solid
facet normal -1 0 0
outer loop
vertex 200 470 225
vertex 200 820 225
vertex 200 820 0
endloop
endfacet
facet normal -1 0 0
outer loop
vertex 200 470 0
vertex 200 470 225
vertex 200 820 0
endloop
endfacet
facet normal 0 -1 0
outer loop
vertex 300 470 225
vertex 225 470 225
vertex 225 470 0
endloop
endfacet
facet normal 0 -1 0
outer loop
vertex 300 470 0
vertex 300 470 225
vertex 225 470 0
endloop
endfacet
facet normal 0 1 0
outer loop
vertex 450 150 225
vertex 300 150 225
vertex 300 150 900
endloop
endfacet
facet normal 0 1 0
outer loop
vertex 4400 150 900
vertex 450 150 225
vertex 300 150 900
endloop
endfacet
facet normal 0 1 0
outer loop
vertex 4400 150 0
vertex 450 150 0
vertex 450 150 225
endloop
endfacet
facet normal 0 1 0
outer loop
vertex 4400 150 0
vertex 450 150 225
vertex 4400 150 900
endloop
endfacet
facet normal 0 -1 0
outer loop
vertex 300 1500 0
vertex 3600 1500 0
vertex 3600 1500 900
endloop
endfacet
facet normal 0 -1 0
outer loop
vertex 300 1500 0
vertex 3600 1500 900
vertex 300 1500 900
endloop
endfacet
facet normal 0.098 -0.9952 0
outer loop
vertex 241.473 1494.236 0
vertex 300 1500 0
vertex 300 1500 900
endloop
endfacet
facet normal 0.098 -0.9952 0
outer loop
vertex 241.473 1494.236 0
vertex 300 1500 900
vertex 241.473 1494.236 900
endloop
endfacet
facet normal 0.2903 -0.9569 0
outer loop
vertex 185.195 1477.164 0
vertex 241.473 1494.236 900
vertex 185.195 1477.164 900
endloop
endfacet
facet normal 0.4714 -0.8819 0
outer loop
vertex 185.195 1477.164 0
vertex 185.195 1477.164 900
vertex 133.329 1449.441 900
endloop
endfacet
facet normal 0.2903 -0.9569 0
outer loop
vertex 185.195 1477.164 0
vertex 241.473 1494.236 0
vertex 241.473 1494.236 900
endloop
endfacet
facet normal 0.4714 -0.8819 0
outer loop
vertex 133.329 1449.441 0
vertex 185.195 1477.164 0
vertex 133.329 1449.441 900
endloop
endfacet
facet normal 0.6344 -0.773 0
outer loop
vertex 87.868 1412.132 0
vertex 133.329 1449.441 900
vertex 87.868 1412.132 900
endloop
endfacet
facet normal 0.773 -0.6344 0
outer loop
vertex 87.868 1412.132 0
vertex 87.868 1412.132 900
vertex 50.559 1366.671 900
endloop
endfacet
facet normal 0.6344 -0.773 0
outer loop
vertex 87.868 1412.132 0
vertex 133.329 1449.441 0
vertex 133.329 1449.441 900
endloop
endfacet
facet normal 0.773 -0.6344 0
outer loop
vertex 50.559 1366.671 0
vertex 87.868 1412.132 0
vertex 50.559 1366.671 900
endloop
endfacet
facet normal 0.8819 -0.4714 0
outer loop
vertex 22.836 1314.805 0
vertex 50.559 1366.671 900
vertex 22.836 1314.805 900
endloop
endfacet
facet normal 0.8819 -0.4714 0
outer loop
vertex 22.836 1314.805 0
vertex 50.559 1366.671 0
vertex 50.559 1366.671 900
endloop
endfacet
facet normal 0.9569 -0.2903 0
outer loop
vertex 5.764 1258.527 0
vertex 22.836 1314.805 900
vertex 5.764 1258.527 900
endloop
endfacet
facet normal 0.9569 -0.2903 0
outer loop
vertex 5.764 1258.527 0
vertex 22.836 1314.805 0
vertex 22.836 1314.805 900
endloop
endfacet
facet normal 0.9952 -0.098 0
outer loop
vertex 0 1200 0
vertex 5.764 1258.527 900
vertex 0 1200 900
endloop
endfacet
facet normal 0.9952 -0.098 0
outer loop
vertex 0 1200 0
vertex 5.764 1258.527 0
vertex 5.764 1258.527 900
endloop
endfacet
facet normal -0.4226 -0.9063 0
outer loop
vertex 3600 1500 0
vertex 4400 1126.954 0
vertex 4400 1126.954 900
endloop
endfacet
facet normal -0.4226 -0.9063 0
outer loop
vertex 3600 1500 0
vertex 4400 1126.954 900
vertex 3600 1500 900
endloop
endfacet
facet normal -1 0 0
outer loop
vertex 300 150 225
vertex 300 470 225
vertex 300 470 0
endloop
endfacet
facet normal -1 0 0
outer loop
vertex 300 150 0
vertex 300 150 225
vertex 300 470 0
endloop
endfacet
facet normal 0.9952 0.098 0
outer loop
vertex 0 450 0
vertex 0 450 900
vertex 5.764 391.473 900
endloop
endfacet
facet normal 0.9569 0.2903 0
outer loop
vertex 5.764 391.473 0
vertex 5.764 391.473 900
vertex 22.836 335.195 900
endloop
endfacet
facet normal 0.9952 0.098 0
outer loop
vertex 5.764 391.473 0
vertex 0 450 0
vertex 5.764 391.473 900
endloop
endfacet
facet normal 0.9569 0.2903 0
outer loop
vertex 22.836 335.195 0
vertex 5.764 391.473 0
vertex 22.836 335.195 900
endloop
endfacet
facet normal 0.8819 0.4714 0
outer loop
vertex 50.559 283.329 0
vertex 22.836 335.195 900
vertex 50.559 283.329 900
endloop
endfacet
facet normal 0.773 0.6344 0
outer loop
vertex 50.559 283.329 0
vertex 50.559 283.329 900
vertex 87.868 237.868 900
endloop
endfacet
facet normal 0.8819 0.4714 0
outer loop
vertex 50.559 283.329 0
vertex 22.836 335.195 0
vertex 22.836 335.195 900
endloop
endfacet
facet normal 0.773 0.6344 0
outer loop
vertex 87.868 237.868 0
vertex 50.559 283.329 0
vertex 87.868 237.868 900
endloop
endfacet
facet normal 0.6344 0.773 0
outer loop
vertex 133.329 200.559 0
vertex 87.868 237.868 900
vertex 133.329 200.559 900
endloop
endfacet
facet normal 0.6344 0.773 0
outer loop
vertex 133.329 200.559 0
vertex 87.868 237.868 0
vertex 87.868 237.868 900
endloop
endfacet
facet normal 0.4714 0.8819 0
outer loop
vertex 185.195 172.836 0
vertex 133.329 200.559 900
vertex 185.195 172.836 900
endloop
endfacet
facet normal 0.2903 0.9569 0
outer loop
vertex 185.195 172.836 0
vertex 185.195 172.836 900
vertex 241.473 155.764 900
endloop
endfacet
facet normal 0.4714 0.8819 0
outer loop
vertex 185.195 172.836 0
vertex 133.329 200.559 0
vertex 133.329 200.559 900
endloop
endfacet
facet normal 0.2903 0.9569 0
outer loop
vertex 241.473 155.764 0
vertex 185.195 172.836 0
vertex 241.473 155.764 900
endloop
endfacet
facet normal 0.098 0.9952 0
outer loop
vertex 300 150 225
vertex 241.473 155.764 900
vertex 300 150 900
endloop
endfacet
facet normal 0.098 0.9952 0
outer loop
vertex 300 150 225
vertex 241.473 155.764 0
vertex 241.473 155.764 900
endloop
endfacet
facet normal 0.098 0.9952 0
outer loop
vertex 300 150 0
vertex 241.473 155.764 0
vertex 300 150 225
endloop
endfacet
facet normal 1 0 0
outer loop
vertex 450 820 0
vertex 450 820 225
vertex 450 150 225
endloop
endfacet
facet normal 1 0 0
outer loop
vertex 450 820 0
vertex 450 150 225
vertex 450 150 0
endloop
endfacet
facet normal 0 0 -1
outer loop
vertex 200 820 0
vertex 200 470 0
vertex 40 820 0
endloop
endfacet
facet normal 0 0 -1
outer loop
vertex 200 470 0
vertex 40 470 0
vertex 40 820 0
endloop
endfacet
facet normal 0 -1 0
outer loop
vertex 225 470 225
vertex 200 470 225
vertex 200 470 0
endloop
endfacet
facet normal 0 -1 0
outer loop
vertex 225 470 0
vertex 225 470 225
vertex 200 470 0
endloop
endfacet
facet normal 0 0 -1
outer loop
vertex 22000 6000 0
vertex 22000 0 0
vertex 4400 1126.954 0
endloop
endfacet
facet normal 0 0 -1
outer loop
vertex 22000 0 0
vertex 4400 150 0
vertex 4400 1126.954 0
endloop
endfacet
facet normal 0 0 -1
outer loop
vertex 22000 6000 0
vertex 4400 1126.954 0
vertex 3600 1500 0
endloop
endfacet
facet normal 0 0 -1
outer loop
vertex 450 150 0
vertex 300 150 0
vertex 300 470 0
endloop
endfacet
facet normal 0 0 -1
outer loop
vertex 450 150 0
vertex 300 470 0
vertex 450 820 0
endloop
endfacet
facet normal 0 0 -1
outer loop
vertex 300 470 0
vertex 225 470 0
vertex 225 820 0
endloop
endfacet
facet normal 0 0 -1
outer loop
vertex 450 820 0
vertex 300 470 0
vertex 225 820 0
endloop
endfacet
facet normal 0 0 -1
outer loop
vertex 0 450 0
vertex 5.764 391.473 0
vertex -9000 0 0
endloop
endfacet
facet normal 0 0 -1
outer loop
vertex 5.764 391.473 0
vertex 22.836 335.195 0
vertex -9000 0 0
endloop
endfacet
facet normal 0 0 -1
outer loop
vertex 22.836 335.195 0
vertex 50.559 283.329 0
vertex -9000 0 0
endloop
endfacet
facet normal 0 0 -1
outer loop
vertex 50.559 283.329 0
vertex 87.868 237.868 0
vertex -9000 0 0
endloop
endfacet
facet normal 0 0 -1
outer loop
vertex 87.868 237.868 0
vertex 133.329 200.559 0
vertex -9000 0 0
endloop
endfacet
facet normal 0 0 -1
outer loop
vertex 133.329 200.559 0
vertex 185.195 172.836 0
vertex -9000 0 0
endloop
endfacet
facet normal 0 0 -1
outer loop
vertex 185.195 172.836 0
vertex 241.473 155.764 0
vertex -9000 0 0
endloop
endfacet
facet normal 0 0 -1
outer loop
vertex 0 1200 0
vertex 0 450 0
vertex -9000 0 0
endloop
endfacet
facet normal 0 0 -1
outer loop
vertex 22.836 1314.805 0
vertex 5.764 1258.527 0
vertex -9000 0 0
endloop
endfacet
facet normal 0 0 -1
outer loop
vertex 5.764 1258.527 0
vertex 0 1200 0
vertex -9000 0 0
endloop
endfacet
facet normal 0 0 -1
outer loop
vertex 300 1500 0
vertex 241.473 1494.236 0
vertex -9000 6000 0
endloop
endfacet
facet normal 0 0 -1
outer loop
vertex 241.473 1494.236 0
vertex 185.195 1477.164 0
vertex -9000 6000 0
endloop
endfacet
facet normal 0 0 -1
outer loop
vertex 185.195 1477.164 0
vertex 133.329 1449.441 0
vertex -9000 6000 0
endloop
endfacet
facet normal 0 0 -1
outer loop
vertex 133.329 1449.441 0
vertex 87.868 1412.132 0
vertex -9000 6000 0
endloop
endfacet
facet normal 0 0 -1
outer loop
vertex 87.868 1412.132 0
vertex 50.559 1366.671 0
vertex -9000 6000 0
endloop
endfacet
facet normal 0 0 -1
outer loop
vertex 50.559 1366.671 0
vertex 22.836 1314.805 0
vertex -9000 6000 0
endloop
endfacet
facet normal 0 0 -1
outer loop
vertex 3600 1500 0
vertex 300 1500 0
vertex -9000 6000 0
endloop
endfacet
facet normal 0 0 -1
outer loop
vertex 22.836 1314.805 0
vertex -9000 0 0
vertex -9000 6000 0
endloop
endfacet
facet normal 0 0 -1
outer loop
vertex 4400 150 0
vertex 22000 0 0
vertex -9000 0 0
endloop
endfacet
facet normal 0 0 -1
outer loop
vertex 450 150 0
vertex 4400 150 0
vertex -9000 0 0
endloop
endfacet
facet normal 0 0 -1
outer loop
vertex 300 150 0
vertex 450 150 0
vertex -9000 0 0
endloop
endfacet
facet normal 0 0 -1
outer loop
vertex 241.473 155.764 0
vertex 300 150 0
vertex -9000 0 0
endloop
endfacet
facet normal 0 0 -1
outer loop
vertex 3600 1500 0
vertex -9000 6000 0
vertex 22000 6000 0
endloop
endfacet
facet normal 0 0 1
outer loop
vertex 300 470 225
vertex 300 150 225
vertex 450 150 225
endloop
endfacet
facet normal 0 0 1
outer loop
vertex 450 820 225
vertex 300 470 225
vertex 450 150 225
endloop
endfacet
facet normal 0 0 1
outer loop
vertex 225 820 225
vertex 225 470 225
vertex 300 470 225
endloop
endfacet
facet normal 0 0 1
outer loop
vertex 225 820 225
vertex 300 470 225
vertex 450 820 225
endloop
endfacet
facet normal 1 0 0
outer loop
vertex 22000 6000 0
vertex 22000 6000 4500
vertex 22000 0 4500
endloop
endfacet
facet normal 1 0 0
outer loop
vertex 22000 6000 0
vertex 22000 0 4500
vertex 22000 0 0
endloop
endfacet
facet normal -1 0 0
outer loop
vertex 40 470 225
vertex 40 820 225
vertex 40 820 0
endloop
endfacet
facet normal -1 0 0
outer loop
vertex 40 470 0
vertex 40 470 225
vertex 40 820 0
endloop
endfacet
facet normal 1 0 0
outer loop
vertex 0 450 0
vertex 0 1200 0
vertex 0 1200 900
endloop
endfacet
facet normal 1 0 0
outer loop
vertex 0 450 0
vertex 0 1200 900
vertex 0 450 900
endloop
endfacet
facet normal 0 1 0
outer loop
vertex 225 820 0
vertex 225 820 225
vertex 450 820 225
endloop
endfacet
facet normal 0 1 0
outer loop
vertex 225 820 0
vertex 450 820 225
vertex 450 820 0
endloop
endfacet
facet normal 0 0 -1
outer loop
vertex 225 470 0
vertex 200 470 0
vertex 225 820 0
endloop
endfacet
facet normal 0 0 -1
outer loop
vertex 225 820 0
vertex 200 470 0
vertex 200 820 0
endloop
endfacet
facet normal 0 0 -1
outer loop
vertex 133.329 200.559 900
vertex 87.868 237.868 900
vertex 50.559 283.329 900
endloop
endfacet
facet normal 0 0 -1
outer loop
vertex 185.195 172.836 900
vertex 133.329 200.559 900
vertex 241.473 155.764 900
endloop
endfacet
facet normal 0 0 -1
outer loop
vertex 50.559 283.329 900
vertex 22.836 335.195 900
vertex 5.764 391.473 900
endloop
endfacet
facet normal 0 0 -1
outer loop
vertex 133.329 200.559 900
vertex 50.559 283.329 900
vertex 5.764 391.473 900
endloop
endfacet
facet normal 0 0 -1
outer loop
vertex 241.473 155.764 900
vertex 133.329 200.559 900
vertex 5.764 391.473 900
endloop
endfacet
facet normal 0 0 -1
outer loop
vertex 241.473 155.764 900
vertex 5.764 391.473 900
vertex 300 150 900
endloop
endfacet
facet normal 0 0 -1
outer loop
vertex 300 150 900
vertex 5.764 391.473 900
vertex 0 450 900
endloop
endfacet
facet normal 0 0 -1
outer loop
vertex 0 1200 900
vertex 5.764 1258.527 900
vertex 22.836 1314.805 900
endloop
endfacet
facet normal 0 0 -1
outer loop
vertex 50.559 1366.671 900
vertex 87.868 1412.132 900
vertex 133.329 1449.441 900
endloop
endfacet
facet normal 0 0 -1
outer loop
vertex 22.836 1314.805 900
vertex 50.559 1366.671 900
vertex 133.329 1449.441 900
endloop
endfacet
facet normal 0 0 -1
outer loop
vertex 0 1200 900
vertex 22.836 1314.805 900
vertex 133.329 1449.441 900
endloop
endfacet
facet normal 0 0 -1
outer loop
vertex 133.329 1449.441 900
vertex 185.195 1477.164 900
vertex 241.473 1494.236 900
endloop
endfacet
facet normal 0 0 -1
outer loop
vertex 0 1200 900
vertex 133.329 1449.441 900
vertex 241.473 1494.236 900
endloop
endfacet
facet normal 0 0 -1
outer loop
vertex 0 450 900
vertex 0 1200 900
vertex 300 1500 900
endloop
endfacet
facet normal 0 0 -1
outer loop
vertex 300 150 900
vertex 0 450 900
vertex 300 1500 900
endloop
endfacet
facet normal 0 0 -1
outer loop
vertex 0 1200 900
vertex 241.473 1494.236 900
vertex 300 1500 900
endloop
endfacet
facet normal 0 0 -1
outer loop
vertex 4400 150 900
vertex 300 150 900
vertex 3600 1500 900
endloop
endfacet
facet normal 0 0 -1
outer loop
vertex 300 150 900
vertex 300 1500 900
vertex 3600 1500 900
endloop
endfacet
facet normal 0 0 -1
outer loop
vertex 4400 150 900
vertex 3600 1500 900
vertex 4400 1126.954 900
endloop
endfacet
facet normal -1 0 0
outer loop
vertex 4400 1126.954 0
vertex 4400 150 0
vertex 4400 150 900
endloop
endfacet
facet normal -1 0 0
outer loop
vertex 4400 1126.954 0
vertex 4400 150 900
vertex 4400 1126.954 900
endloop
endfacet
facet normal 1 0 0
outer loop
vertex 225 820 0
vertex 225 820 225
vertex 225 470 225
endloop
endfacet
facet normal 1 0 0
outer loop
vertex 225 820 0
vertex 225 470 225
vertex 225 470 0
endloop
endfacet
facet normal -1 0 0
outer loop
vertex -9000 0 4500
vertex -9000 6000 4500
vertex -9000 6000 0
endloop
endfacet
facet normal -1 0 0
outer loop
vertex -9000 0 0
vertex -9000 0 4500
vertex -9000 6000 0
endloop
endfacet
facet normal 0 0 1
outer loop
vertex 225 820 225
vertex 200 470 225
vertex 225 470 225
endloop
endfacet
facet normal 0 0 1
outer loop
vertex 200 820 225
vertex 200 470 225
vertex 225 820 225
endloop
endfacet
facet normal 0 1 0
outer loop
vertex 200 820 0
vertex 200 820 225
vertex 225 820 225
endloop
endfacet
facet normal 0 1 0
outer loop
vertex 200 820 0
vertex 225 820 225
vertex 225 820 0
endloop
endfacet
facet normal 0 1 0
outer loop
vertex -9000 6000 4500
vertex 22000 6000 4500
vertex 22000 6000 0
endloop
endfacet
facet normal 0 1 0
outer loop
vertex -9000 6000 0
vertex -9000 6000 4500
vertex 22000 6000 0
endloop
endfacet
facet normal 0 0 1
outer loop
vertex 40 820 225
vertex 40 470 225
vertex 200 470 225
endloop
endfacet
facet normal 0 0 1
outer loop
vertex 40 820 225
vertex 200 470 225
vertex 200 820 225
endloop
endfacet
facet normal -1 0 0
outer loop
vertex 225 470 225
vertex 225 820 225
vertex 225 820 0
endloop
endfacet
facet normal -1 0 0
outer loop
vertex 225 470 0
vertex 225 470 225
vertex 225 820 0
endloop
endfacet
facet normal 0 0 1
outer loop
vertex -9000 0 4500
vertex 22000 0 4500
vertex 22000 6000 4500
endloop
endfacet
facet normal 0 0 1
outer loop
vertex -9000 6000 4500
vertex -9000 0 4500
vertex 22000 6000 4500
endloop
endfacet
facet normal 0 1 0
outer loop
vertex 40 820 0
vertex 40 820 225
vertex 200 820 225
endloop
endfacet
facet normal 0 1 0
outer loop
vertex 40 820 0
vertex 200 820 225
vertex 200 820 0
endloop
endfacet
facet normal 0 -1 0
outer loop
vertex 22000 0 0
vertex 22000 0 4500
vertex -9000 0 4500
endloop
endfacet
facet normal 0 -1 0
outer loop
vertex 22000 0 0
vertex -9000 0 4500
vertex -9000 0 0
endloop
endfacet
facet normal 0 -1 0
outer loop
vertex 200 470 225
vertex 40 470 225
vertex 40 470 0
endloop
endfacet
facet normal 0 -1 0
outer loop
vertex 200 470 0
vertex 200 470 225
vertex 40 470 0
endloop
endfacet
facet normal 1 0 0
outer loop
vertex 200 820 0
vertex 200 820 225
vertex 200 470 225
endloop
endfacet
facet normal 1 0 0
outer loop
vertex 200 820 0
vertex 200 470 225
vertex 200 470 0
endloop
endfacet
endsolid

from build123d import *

# Parameters (mm, degrees)
CAR_BODY_DEPTH      = 900
GRILLE_DUCT_START   = 40
SKETCH2_W           = 235
SKETCH2_H           = 350
GRILLE_DUCT_DEPTH   = 410
FLOOR_EXIT_START    = 300
SKETCH3_W           = 235
SKETCH3_H           = 375
FLOOR_EXIT_DEPTH    = 150
RADIATOR_START      = 200
SKETCH4_W           = 225
SKETCH4_H           = 350
RADIATOR_DEPTH      = 25
RADIATOR_TOOL_START = 200
SKETCH5_W           = 225
SKETCH5_H           = 350
RADIATOR_TOOL_DEPTH = 25
FLUID_DOMAIN_START  = -9000
SKETCH6_W           = 4500
SKETCH6_H           = 6000
FLUID_DOMAIN_DEPTH  = 31000


with BuildPart() as part:
    # Sketch1 → car_body (new body)
    with BuildSketch(Plane.XY):
        with BuildLine():
            Line((300, 150), (4400, 150))
            Line((4400, 150), (4400, 1126.953873476))
            Line((4400, 1126.953873476), (3600, 1500))
            Line((3600, 1500), (300, 1500))
            ThreePointArc((300, 1500), (87.867965644, 1412.132034356), (0, 1200))
            Line((0, 1200), (0, 450))
            ThreePointArc((0, 450), (87.867965644, 237.867965644), (300, 150))
        make_face()
    extrude(amount=CAR_BODY_DEPTH)


with BuildPart() as body_2:
    # Sketch2 → grille_duct (new body)
    with BuildSketch(Plane(origin=(0, 0, 0), x_dir=(0, 0, -1), z_dir=(1, 0, 0)).offset(GRILLE_DUCT_START)):
        with Locations((-107.5, 645)):
            Rectangle(SKETCH2_W, SKETCH2_H)
    extrude(amount=GRILLE_DUCT_DEPTH)


with BuildPart() as part_1:
    add(part.part)

    # Combine1: cut body 2
    add(body_2.part, mode=Mode.SUBTRACT)


with BuildPart() as body_2_2:
    # Sketch3 → floor_exit (new body)
    with BuildSketch(Plane(origin=(0, 0, 0), x_dir=(0, 0, -1), z_dir=(1, 0, 0)).offset(FLOOR_EXIT_START)):
        with Locations((-107.5, 287.5)):
            Rectangle(SKETCH3_W, SKETCH3_H)
    extrude(amount=FLOOR_EXIT_DEPTH)


with BuildPart() as part_2:
    add(part_1.part)

    # Combine2: cut body 2 2
    add(body_2_2.part, mode=Mode.SUBTRACT)


with BuildPart() as body_2_3:
    # Sketch4 → radiator (new body)
    with BuildSketch(Plane(origin=(0, 0, 0), x_dir=(0, 0, -1), z_dir=(1, 0, 0)).offset(RADIATOR_START)):
        with Locations((-112.5, 645)):
            Rectangle(SKETCH4_W, SKETCH4_H)
    extrude(amount=RADIATOR_DEPTH)


with BuildPart() as body_3:
    # Sketch5 → radiator_tool (new body)
    with BuildSketch(Plane(origin=(0, 0, 0), x_dir=(0, 0, -1), z_dir=(1, 0, 0)).offset(RADIATOR_TOOL_START)):
        with Locations((-112.5, 645)):
            Rectangle(SKETCH5_W, SKETCH5_H)
    extrude(amount=RADIATOR_TOOL_DEPTH)


with BuildPart() as body_4:
    # Sketch6 → fluid_domain (new body)
    with BuildSketch(Plane(origin=(0, 0, 0), x_dir=(0, 0, -1), z_dir=(1, 0, 0)).offset(FLUID_DOMAIN_START)):
        with Locations((-2250, 3000)):
            Rectangle(SKETCH6_W, SKETCH6_H)
    extrude(amount=FLUID_DOMAIN_DEPTH)

    # Combine3: cut part
    add(part_2.part, mode=Mode.SUBTRACT)

    # Combine4: cut body 3
    add(body_3.part, mode=Mode.SUBTRACT)


solid = Compound([body_2_3.part, body_4.part])
